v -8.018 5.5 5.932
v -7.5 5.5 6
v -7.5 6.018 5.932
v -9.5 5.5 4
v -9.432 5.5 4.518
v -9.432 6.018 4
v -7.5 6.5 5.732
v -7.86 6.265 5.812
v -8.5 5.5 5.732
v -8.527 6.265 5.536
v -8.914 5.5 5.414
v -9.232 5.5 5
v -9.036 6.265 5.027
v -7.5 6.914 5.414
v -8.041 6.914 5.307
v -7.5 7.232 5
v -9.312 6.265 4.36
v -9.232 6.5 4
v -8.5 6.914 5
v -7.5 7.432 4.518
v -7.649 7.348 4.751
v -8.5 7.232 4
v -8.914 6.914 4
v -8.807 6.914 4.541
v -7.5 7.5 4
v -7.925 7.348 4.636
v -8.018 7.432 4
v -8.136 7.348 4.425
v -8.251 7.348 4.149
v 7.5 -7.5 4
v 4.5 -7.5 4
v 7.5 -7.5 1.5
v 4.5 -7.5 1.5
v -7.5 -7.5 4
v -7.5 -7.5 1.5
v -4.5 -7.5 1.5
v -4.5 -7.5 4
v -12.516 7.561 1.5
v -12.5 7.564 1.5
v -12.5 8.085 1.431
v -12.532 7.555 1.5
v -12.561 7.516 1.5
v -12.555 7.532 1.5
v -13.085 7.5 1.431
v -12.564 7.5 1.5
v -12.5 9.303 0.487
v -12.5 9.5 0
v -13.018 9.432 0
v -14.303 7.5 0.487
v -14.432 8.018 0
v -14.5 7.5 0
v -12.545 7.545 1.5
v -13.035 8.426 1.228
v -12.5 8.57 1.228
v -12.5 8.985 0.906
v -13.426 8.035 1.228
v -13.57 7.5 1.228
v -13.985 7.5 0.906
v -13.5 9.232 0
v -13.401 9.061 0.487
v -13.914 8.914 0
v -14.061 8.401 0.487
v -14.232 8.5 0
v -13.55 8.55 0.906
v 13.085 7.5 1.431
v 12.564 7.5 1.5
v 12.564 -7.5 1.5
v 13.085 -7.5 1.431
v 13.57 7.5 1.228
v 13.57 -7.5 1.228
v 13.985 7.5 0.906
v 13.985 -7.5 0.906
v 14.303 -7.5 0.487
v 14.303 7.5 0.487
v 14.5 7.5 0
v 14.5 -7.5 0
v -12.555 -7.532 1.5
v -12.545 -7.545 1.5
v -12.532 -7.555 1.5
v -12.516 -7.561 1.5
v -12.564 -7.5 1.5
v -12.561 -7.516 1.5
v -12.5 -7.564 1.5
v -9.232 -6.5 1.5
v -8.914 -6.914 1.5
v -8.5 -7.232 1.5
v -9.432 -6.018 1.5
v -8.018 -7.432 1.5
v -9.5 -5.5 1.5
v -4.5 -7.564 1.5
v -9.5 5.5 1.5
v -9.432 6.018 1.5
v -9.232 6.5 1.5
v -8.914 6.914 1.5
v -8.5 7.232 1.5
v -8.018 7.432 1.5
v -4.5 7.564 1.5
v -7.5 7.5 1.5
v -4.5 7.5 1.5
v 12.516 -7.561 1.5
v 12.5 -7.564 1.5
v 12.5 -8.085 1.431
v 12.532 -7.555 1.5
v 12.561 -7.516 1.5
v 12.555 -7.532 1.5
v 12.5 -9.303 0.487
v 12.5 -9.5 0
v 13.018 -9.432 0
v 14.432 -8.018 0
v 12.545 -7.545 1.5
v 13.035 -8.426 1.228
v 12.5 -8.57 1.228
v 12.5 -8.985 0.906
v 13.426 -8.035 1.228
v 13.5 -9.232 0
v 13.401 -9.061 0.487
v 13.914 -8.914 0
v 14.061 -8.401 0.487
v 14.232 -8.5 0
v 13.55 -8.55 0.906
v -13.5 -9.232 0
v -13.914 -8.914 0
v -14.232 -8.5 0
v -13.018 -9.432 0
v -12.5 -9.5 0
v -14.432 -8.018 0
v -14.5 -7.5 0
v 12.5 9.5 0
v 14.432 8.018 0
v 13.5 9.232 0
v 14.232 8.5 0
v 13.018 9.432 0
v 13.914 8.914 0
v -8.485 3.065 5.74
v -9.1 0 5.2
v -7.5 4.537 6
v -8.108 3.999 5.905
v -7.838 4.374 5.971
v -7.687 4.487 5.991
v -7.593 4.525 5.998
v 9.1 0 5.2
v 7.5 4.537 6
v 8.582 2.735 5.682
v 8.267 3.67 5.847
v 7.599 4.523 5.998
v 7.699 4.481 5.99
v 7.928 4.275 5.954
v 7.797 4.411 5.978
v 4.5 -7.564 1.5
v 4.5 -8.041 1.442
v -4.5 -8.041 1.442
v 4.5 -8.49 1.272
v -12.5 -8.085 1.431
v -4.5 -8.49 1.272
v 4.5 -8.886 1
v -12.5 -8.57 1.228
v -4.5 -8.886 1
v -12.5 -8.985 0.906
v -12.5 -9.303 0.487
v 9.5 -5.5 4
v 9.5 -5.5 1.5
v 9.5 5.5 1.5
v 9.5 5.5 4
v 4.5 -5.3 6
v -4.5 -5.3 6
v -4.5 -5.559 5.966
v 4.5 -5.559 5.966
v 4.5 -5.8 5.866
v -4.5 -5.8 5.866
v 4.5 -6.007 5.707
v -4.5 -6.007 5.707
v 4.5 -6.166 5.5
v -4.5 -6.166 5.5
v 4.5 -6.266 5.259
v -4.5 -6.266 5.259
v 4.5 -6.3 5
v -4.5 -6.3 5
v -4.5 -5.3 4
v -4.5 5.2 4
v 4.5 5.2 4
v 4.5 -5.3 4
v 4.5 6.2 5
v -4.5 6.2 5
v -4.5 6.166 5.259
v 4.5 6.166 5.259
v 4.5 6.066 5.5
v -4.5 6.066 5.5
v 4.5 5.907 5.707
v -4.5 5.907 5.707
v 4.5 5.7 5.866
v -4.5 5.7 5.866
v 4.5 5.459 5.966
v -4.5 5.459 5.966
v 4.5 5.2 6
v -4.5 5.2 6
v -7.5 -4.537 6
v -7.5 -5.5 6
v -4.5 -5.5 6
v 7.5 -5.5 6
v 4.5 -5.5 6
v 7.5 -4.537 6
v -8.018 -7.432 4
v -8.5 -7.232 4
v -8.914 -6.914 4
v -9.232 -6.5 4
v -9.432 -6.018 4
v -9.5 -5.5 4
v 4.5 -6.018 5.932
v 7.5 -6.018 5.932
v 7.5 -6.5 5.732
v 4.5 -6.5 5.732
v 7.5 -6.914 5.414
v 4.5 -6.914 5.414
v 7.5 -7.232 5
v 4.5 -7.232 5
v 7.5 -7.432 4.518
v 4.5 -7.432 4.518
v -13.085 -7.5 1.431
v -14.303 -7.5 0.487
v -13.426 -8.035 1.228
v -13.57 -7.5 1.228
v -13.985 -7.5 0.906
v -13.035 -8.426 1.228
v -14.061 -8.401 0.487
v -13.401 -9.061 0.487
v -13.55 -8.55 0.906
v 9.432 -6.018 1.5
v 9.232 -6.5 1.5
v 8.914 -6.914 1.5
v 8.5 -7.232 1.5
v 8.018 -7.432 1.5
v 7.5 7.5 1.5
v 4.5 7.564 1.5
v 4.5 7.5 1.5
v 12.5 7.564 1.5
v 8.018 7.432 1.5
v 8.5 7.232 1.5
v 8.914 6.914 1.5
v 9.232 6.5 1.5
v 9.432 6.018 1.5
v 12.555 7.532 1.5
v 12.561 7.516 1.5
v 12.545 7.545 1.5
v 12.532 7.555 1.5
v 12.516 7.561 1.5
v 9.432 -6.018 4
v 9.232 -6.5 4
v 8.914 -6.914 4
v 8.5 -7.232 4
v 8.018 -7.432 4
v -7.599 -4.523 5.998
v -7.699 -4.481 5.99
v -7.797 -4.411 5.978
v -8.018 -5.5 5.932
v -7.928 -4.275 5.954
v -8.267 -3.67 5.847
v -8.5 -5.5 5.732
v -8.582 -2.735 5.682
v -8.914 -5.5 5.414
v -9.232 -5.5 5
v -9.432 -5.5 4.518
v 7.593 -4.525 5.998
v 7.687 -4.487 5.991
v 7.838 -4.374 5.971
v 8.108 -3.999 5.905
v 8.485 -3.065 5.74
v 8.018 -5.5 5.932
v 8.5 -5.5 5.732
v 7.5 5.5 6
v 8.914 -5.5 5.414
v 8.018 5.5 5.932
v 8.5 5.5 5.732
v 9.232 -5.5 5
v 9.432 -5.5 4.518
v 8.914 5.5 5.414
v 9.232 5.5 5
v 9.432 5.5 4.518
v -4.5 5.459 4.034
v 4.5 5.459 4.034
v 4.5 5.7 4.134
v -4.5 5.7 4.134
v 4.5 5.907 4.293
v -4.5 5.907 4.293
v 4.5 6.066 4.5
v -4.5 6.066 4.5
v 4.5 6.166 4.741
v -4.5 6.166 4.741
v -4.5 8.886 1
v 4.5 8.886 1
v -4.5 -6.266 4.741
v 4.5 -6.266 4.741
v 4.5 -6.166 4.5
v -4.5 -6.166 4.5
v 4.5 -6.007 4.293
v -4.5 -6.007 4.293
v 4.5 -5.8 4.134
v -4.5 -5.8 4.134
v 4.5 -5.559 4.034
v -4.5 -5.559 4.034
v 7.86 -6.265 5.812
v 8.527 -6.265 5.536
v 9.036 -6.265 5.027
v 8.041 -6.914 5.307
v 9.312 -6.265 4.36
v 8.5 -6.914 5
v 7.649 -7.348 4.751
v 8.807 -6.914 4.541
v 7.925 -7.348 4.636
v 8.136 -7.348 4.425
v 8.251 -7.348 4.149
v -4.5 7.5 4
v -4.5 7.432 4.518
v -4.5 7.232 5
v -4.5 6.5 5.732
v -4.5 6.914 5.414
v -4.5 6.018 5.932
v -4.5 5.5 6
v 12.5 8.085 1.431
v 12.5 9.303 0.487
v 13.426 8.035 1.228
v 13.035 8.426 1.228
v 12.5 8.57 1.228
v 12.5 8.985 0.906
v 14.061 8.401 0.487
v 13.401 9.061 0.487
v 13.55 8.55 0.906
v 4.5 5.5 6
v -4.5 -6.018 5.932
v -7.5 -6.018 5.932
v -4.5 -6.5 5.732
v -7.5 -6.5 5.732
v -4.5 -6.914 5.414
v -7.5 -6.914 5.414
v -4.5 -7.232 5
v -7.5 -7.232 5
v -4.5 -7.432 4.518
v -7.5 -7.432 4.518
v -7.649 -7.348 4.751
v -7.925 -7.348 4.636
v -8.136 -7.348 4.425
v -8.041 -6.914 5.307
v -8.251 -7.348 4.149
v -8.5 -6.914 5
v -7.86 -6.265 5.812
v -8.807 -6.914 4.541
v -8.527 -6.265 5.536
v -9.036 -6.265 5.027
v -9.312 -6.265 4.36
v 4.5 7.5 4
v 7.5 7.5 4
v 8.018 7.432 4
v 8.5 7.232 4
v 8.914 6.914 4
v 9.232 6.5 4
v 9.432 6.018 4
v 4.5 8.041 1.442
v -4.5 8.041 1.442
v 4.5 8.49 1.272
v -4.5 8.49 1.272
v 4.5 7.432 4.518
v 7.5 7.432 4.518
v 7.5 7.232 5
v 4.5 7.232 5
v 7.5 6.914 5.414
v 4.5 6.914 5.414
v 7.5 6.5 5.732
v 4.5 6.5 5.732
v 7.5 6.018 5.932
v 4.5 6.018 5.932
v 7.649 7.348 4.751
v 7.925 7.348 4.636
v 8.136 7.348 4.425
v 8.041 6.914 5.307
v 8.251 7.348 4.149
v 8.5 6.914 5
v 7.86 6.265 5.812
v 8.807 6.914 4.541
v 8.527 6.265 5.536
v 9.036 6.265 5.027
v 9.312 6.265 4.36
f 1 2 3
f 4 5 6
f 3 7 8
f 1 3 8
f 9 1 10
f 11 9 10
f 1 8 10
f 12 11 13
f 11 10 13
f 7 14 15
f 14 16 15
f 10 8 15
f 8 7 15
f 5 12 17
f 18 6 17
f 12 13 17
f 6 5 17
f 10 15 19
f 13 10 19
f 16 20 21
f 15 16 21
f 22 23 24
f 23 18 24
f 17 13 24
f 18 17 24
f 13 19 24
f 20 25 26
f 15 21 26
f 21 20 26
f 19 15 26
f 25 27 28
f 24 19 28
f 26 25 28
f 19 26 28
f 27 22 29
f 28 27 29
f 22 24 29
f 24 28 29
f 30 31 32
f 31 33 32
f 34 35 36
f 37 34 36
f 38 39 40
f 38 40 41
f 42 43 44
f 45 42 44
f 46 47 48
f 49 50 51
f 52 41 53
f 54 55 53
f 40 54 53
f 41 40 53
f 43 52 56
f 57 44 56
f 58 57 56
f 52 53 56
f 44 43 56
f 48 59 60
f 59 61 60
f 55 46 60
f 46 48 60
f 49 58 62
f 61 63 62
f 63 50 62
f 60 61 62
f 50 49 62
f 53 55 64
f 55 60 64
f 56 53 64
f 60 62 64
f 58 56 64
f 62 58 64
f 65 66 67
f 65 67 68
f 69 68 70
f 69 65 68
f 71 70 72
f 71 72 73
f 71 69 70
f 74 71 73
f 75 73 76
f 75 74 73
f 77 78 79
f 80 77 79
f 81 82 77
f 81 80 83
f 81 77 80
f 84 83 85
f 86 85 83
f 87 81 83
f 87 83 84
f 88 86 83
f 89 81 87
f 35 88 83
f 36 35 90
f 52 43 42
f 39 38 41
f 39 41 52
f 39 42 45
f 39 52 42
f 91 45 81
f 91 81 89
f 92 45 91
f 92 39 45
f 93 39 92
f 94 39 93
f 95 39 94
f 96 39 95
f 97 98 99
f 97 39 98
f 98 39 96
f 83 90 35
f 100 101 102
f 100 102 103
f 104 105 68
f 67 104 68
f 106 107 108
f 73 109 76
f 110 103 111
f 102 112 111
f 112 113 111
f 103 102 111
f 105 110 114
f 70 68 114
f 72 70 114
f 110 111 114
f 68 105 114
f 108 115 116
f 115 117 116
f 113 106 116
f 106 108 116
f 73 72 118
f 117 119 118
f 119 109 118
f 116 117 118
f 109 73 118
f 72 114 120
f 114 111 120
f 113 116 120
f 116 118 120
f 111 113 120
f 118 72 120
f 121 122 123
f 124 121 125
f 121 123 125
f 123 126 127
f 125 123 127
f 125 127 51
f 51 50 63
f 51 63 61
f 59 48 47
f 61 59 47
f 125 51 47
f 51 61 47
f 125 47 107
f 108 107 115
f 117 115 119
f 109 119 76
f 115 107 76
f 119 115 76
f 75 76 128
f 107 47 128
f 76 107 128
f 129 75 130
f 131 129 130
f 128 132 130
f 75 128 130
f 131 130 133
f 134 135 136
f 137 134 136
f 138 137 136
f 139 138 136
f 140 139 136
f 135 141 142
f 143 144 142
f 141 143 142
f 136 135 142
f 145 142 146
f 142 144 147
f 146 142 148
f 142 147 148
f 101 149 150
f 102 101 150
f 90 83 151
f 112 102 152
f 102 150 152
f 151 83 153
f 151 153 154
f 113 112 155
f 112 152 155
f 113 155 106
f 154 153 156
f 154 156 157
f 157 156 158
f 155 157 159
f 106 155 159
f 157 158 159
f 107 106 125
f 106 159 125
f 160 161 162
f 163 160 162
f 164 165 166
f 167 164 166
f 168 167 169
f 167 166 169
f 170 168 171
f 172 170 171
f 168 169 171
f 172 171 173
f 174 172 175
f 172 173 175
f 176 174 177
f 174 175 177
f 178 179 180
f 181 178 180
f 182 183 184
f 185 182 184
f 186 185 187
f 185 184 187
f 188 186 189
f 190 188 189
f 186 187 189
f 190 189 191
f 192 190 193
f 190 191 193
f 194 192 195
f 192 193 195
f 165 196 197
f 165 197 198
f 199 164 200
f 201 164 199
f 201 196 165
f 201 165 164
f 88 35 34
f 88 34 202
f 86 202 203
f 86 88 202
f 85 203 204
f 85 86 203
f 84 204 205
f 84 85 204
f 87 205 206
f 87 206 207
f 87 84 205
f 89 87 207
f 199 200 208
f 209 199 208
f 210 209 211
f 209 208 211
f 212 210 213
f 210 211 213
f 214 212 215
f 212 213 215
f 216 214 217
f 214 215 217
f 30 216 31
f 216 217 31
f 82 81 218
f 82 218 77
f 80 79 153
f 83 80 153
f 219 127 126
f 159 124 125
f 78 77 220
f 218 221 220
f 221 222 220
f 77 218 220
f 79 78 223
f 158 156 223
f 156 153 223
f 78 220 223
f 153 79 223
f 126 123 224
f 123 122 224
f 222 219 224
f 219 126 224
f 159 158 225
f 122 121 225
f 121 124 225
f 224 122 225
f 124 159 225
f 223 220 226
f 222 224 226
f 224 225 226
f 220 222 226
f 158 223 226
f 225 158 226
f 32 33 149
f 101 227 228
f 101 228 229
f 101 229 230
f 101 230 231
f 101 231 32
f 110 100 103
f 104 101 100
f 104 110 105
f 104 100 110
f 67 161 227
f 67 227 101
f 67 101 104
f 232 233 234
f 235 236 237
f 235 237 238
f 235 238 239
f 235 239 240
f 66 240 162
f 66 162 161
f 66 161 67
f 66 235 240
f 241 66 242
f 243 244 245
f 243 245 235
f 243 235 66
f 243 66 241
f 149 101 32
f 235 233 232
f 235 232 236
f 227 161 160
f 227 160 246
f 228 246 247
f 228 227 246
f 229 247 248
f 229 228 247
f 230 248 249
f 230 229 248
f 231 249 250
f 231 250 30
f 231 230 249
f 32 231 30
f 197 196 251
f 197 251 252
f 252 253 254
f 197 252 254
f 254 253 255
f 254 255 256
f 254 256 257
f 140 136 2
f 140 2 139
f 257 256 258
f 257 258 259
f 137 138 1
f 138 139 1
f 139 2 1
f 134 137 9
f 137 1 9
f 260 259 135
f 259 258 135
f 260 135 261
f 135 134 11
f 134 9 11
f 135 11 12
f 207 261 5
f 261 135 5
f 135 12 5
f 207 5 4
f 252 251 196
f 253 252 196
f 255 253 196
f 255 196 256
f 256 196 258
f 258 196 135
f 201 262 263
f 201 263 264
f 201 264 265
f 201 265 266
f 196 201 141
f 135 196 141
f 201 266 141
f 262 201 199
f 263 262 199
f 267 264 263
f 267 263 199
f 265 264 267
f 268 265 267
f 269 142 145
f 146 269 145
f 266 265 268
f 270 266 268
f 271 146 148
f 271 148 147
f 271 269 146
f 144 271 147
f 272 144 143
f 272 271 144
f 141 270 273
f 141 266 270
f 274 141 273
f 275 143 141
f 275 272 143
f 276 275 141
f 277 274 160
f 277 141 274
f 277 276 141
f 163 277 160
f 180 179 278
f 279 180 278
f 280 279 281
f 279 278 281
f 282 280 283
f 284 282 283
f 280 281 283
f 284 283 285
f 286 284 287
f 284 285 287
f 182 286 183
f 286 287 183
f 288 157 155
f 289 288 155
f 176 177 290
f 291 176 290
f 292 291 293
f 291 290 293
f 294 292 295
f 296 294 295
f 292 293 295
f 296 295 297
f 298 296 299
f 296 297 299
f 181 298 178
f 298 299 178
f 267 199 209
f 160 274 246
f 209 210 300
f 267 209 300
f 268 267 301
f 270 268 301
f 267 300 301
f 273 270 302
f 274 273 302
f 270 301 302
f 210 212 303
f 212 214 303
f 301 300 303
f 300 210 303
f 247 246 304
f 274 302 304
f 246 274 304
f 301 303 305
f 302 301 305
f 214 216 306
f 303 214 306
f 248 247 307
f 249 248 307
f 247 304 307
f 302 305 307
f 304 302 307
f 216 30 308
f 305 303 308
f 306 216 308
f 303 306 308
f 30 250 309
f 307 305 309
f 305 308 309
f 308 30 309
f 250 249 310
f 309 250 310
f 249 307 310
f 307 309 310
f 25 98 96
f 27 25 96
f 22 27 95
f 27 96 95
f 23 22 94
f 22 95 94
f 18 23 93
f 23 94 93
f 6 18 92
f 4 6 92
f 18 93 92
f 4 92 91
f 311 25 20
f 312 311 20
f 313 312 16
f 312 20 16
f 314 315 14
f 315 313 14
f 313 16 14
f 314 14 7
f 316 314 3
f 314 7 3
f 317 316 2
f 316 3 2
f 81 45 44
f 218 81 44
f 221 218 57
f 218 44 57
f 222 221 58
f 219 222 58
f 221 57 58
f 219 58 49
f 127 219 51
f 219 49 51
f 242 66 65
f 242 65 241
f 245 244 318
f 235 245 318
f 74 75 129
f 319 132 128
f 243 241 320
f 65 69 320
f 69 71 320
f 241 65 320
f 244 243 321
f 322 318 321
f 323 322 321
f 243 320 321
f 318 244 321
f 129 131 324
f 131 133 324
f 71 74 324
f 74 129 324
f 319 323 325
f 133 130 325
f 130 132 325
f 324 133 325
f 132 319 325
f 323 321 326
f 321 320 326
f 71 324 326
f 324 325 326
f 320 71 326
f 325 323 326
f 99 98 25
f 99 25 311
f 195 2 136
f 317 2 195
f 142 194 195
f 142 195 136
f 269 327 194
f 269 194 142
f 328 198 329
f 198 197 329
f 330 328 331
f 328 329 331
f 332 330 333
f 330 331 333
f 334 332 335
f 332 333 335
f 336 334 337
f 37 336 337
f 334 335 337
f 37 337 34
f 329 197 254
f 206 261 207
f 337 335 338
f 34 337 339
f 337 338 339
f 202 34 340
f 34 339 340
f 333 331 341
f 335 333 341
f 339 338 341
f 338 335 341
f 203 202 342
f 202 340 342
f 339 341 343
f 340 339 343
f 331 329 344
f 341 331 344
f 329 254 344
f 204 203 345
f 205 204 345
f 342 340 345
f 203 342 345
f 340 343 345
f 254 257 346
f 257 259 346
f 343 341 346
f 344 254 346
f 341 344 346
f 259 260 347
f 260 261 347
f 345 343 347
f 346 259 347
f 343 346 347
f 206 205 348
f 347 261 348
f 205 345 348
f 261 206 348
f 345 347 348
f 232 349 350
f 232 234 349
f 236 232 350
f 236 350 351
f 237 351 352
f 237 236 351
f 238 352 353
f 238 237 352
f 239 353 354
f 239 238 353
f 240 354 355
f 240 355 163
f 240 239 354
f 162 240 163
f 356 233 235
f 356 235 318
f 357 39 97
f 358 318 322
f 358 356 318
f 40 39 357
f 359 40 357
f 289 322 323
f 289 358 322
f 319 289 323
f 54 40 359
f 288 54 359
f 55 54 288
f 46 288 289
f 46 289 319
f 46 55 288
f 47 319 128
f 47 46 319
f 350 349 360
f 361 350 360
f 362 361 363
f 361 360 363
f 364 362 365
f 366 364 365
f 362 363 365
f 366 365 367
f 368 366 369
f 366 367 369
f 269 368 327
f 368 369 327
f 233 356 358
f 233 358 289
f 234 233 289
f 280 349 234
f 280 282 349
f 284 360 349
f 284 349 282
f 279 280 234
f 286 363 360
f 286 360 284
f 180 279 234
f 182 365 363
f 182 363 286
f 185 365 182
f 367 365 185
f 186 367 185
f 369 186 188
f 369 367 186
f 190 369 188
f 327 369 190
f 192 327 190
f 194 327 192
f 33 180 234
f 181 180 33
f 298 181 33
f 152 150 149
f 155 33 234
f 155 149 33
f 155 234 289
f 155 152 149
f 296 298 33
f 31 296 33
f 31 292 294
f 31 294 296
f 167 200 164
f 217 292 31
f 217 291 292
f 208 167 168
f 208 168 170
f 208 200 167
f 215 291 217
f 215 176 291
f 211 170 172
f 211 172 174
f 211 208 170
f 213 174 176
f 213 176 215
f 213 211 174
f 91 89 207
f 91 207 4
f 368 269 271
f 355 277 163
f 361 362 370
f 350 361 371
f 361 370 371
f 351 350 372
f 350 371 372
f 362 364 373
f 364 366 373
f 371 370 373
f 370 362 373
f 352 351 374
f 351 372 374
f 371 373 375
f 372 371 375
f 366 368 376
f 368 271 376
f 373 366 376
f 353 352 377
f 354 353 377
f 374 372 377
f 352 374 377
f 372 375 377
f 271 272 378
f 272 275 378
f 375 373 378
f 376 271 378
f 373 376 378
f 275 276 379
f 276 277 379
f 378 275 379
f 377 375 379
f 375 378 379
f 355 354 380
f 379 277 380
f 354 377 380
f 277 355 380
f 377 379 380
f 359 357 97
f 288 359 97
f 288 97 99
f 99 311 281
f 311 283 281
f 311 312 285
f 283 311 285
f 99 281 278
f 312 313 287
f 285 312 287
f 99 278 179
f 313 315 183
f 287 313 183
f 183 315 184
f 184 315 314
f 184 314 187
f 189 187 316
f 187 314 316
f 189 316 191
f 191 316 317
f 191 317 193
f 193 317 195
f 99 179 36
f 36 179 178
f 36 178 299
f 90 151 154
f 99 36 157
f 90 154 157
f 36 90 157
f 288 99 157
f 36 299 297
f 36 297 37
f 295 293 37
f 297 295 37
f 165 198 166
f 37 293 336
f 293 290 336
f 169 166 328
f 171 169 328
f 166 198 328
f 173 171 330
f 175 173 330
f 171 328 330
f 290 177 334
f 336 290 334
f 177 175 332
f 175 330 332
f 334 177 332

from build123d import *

# Parameters (mm, degrees)
F1_DEPTH      = 1.5
F2_W          = 19
F2_H          = 15
F3_DEPTH      = 4.5
F4_W          = 9
F4_H          = 3
F5_DEPTH      = 12.5
F6_W          = 9
F6_H          = 2
F7_DEPTH      = 1.2
F8_W          = 9
F8_H          = 2
F9_DEPTH      = 1.3
F10_R         = 2
F11_T1_DEPTH  = 8
F11_T3_DEPTH  = 2.5
F11_T5_DEPTH  = 8
F11_T7_DEPTH  = 15
F11_T9_DEPTH  = 12.8412291828
F11_T11_DEPTH = 12.8412291828
F11_T14_ANGLE = 90
F11_T16_ANGLE = 90
F11_T18_ANGLE = 90
F11_T20_ANGLE = 90
F11_T22_ANGLE = 90
F11_T24_ANGLE = 90
F11_T26_ANGLE = 90
F11_T28_ANGLE = 90
F12_T1_DEPTH  = 9
F14_DEPTH     = 12.5


# Not quite as in the source:
# - a fillet or chamfer that OpenCascade refuses, or shapes differently, is made with other operations: its cross-section is extruded or revolved along the edge and cut away or added


with BuildPart() as f1:
    # F0 (on Top) → F1 (new body)
    with BuildSketch(Plane.XY):
        with BuildLine():
            Line((12.5, 9.5), (-12.5, 9.5))
            ThreePointArc((-12.5, 9.5), (-13.9142135624, 8.9142135624), (-14.5, 7.5))
            Line((-14.5, 7.5), (-14.5, -7.5))
            ThreePointArc((-14.5, -7.5), (-13.9142135624, -8.9142135624), (-12.5, -9.5))
            Line((-12.5, -9.5), (12.5, -9.5))
            ThreePointArc((12.5, -9.5), (13.9142135624, -8.9142135624), (14.5, -7.5))
            Line((14.5, -7.5), (14.5, 7.5))
            ThreePointArc((14.5, 7.5), (13.9142135624, 8.9142135624), (12.5, 9.5))
        make_face()
    extrude(amount=F1_DEPTH)

    # F2 (on face) → F3 (join)
    with BuildSketch(Plane.XY.offset(1.5)):
        Rectangle(F2_W, F2_H)
    extrude(amount=F3_DEPTH)

    # F4 (on Front) → F5 (cut, symmetric)
    with BuildSketch(Plane.XZ):
        with Locations((0, 2.5)):
            Rectangle(F4_W, F4_H)
    extrude(amount=F5_DEPTH, both=True, mode=Mode.SUBTRACT)

    # F6 (on face) → F7 (cut)
    with BuildSketch(Plane.XZ.offset(7.5)):
        with Locations((0, 5)):
            Rectangle(F6_W, F6_H)
    extrude(amount=-F7_DEPTH, mode=Mode.SUBTRACT)

    # F8 (on face) → F9 (cut)
    with BuildSketch(Plane(origin=(0, 7.5, 0), x_dir=(-1, 0, 0), z_dir=(0, 1, 0))):
        with Locations((0, 5)):
            Rectangle(F8_W, F8_H)
    extrude(amount=-F9_DEPTH, mode=Mode.SUBTRACT)

    # F10
    f10_edges = [f1.edges().sort_by_distance(p)[0] for p in [
        (9.5, 0, 6),
        (-9.5, 0, 6),
    ]]
    fillet(f10_edges, radius=F10_R)

    # F11: fillet of radius 2 on 18 edges, made by hand

    # F11_s2 → F11_t1 (cut)
    with BuildSketch(Plane.YZ.offset(-0.5)):
        with BuildLine():
            ThreePointArc((7.5, 4), (6.9142135624, 5.4142135624), (5.5, 6))
            Line((5.5, 6), (7.5, 6))
            Line((7.5, 6), (7.5, 4))
        make_face()
        with BuildLine():
            ThreePointArc((-5.5, 6), (-6.9142135624, 5.4142135624), (-7.5, 4))
            Line((-7.5, 4), (-7.5, 6))
            Line((-7.5, 6), (-5.5, 6))
        make_face()
    extrude(amount=F11_T1_DEPTH, mode=Mode.SUBTRACT)

    # F11_s4 → F11_t3 (cut)
    with BuildSketch(Plane.XY.offset(1.5)):
        with BuildLine():
            ThreePointArc((7.5, 7.5), (8.9142135624, 6.9142135624), (9.5, 5.5))
            Line((9.5, 5.5), (9.5, 7.5))
            Line((9.5, 7.5), (7.5, 7.5))
        make_face()
        with BuildLine():
            ThreePointArc((-7.5, 7.5), (-8.9142135624, 6.9142135624), (-9.5, 5.5))
            Line((-9.5, 5.5), (-9.5, 7.5))
            Line((-9.5, 7.5), (-7.5, 7.5))
        make_face()
        with BuildLine():
            ThreePointArc((9.5, -5.5), (8.9142135624, -6.9142135624), (7.5, -7.5))
            Line((7.5, -7.5), (9.5, -7.5))
            Line((9.5, -7.5), (9.5, -5.5))
        make_face()
        with BuildLine():
            ThreePointArc((-7.5, -7.5), (-8.9142135624, -6.9142135624), (-9.5, -5.5))
            Line((-9.5, -5.5), (-9.5, -7.5))
            Line((-9.5, -7.5), (-7.5, -7.5))
        make_face()
    extrude(amount=F11_T3_DEPTH, mode=Mode.SUBTRACT)

    # F11_s6 → F11_t5 (cut)
    with BuildSketch(Plane.YZ.offset(-7.5)):
        with BuildLine():
            ThreePointArc((5.5, 6), (6.9142135624, 5.4142135624), (7.5, 4))
            Line((7.5, 4), (7.5, 6))
            Line((7.5, 6), (5.5, 6))
        make_face()
        with BuildLine():
            ThreePointArc((-5.5, 6), (-6.9142135624, 5.4142135624), (-7.5, 4))
            Line((-7.5, 4), (-7.5, 6))
            Line((-7.5, 6), (-5.5, 6))
        make_face()
    extrude(amount=F11_T5_DEPTH, mode=Mode.SUBTRACT)

    # F11_s8 → F11_t7 (cut)
    with BuildSketch(Plane.XZ.offset(-7.5)):
        with BuildLine():
            ThreePointArc((12.5635083269, 1.5), (13.7882531983, 1.0811388301), (14.5, 0))
            Line((14.5, 0), (14.5, 1.5))
            Line((14.5, 1.5), (12.5635083269, 1.5))
        make_face()
        with BuildLine():
            ThreePointArc((-12.5635083269, 1.5), (-13.7882531983, 1.0811388301), (-14.5, 0))
            Line((-14.5, 0), (-14.5, 1.5))
            Line((-14.5, 1.5), (-12.5635083269, 1.5))
        make_face()
    extrude(amount=F11_T7_DEPTH, mode=Mode.SUBTRACT)

    # F11_s10 → F11_t9 (cut)
    with BuildSketch(Plane.YZ.offset(-0.3412291828)):
        with BuildLine():
            ThreePointArc((-7.5635083269, 1.5), (-8.7882531983, 1.0811388301), (-9.5, 0))
            Line((-9.5, 0), (-9.5, 1.5))
            Line((-9.5, 1.5), (-7.5635083269, 1.5))
        make_face()
        with BuildLine():
            ThreePointArc((7.5635083269, 1.5), (8.7882531983, 1.0811388301), (9.5, 0))
            Line((9.5, 0), (9.5, 1.5))
            Line((9.5, 1.5), (7.5635083269, 1.5))
        make_face()
    extrude(amount=F11_T9_DEPTH, mode=Mode.SUBTRACT)

    # F11_s12 → F11_t11 (cut)
    with BuildSketch(Plane.YZ.offset(-12.5)):
        with BuildLine():
            ThreePointArc((-9.5, 0), (-8.7882531983, 1.0811388301), (-7.5635083269, 1.5))
            Line((-7.5635083269, 1.5), (-9.5, 1.5))
            Line((-9.5, 1.5), (-9.5, 0))
        make_face()
        with BuildLine():
            ThreePointArc((9.5, 0), (8.7882531983, 1.0811388301), (7.5635083269, 1.5))
            Line((7.5635083269, 1.5), (9.5, 1.5))
            Line((9.5, 1.5), (9.5, 0))
        make_face()
    extrude(amount=F11_T11_DEPTH, mode=Mode.SUBTRACT)

    # F11_s13 → F11_t14 (revolve, cut)
    with BuildSketch(Plane.YZ.offset(7.5)):
        with BuildLine():
            ThreePointArc((7.5, 4), (6.9142135624, 5.4142135624), (5.5, 6))
            Line((5.5, 6), (7.5, 6))
            Line((7.5, 6), (7.5, 4))
        make_face()
    revolve(axis=Axis((7.5, 7.5, 4), (0, 1, 0)), revolution_arc=F11_T14_ANGLE, mode=Mode.SUBTRACT)

    # F11_s15 → F11_t16 (revolve, cut)
    with BuildSketch(Plane.YZ.offset(-7.5)):
        with BuildLine():
            ThreePointArc((5.5, 6), (6.9142135624, 5.4142135624), (7.5, 4))
            Line((7.5, 4), (7.5, 6))
            Line((7.5, 6), (5.5, 6))
        make_face()
    revolve(axis=Axis((-7.5, 7.5, 4), (0, -1, 0)), revolution_arc=F11_T16_ANGLE, mode=Mode.SUBTRACT)

    # F11_s17 → F11_t18 (revolve, cut)
    with BuildSketch(Plane.YZ.offset(7.5)):
        with BuildLine():
            ThreePointArc((-5.5, 6), (-6.9142135624, 5.4142135624), (-7.5, 4))
            Line((-7.5, 4), (-7.5, 6))
            Line((-7.5, 6), (-5.5, 6))
        make_face()
    revolve(axis=Axis((7.5, -7.5, 4), (0, 1, 0)), revolution_arc=F11_T18_ANGLE, mode=Mode.SUBTRACT)

    # F11_s19 → F11_t20 (revolve, cut)
    with BuildSketch(Plane.YZ.offset(-7.5)):
        with BuildLine():
            ThreePointArc((-7.5, 4), (-6.9142135624, 5.4142135624), (-5.5, 6))
            Line((-5.5, 6), (-7.5, 6))
            Line((-7.5, 6), (-7.5, 4))
        make_face()
    revolve(axis=Axis((-7.5, -7.5, 4), (0, -1, 0)), revolution_arc=F11_T20_ANGLE, mode=Mode.SUBTRACT)

    # F11_s21 → F11_t22 (revolve, cut)
    with BuildSketch(Plane.YZ.offset(-12.5)):
        with BuildLine():
            ThreePointArc((7.5635083269, 1.5), (8.7882531983, 1.0811388301), (9.5, 0))
            Line((9.5, 0), (9.5, 1.5))
            Line((9.5, 1.5), (7.5635083269, 1.5))
        make_face()
    revolve(axis=Axis((-12.5, 7.5, 1.5), (0, 0, 1)), revolution_arc=F11_T22_ANGLE, mode=Mode.SUBTRACT)

    # F11_s23 → F11_t24 (revolve, cut)
    with BuildSketch(Plane.XZ.offset(-7.5)):
        with BuildLine():
            ThreePointArc((12.5635083269, 1.5), (13.7882531983, 1.0811388301), (14.5, 0))
            Line((14.5, 0), (14.5, 1.5))
            Line((14.5, 1.5), (12.5635083269, 1.5))
        make_face()
    revolve(axis=Axis((12.5, 7.5, 1.5), (0, 0, 1)), revolution_arc=F11_T24_ANGLE, mode=Mode.SUBTRACT)

    # F11_s25 → F11_t26 (revolve, cut)
    with BuildSketch(Plane.XZ.offset(7.5)):
        with BuildLine():
            ThreePointArc((-12.5635083269, 1.5), (-13.7882531983, 1.0811388301), (-14.5, 0))
            Line((-14.5, 0), (-14.5, 1.5))
            Line((-14.5, 1.5), (-12.5635083269, 1.5))
        make_face()
    revolve(axis=Axis((-12.5, -7.5, 1.5), (0, 0, 1)), revolution_arc=F11_T26_ANGLE, mode=Mode.SUBTRACT)

    # F11_s27 → F11_t28 (revolve, cut)
    with BuildSketch(Plane.YZ.offset(12.5)):
        with BuildLine():
            ThreePointArc((-7.5635083269, 1.5), (-8.7882531983, 1.0811388301), (-9.5, 0))
            Line((-9.5, 0), (-9.5, 1.5))
            Line((-9.5, 1.5), (-7.5635083269, 1.5))
        make_face()
    revolve(axis=Axis((12.5, -7.5, 1.5), (0, 0, 1)), revolution_arc=F11_T28_ANGLE, mode=Mode.SUBTRACT)

    # F12: fillet of radius 1 on 4 edges, made by hand

    # F12_s2 → F12_t1 (cut)
    with BuildSketch(Plane.YZ.offset(-4.5)):
        with BuildLine():
            ThreePointArc((-6.3, 5), (-6.0071067812, 4.2928932188), (-5.3, 4))
            Line((-5.3, 4), (-6.3, 4))
            Line((-6.3, 4), (-6.3, 5))
        make_face()
        with BuildLine():
            ThreePointArc((5.2, 4), (5.9071067812, 4.2928932188), (6.2, 5))
            Line((6.2, 5), (6.2, 4))
            Line((6.2, 4), (5.2, 4))
        make_face()
        with BuildLine():
            ThreePointArc((6.2, 5), (5.9071067812, 5.7071067812), (5.2, 6))
            Line((5.2, 6), (5.2, 6.1))
            ThreePointArc((5.2, 6.1), (5.5, 6.1), (6.235, 5.9671743695))
            Line((6.235, 5.9671743695), (6.3, 5.8734993995))
            Line((6.3, 5.8734993995), (6.3, 5))
            Line((6.3, 5), (6.2, 5))
        make_face()
        with BuildLine():
            ThreePointArc((-5.3, 6), (-6.0071067812, 5.7071067812), (-6.3, 5))
            Line((-6.3, 5), (-6.4, 5))
            Line((-6.4, 5), (-6.4, 5.833030278))
            Line((-6.4, 5.833030278), (-6.34, 5.9246817919))
            ThreePointArc((-6.34, 5.9246817919), (-5.5, 6.1), (-5.3, 6.1))
            Line((-5.3, 6.1), (-5.3, 6))
        make_face()
    extrude(amount=F12_T1_DEPTH, mode=Mode.SUBTRACT)

    # F13 (on Right) → F14 (cut, symmetric)
    with BuildSketch(Plane.YZ):
        Polygon((-10, 6.9632698071), (0, 5.2), (10, 6.9632698071), align=None)
    extrude(amount=F14_DEPTH, both=True, mode=Mode.SUBTRACT)


solid = f1.part
